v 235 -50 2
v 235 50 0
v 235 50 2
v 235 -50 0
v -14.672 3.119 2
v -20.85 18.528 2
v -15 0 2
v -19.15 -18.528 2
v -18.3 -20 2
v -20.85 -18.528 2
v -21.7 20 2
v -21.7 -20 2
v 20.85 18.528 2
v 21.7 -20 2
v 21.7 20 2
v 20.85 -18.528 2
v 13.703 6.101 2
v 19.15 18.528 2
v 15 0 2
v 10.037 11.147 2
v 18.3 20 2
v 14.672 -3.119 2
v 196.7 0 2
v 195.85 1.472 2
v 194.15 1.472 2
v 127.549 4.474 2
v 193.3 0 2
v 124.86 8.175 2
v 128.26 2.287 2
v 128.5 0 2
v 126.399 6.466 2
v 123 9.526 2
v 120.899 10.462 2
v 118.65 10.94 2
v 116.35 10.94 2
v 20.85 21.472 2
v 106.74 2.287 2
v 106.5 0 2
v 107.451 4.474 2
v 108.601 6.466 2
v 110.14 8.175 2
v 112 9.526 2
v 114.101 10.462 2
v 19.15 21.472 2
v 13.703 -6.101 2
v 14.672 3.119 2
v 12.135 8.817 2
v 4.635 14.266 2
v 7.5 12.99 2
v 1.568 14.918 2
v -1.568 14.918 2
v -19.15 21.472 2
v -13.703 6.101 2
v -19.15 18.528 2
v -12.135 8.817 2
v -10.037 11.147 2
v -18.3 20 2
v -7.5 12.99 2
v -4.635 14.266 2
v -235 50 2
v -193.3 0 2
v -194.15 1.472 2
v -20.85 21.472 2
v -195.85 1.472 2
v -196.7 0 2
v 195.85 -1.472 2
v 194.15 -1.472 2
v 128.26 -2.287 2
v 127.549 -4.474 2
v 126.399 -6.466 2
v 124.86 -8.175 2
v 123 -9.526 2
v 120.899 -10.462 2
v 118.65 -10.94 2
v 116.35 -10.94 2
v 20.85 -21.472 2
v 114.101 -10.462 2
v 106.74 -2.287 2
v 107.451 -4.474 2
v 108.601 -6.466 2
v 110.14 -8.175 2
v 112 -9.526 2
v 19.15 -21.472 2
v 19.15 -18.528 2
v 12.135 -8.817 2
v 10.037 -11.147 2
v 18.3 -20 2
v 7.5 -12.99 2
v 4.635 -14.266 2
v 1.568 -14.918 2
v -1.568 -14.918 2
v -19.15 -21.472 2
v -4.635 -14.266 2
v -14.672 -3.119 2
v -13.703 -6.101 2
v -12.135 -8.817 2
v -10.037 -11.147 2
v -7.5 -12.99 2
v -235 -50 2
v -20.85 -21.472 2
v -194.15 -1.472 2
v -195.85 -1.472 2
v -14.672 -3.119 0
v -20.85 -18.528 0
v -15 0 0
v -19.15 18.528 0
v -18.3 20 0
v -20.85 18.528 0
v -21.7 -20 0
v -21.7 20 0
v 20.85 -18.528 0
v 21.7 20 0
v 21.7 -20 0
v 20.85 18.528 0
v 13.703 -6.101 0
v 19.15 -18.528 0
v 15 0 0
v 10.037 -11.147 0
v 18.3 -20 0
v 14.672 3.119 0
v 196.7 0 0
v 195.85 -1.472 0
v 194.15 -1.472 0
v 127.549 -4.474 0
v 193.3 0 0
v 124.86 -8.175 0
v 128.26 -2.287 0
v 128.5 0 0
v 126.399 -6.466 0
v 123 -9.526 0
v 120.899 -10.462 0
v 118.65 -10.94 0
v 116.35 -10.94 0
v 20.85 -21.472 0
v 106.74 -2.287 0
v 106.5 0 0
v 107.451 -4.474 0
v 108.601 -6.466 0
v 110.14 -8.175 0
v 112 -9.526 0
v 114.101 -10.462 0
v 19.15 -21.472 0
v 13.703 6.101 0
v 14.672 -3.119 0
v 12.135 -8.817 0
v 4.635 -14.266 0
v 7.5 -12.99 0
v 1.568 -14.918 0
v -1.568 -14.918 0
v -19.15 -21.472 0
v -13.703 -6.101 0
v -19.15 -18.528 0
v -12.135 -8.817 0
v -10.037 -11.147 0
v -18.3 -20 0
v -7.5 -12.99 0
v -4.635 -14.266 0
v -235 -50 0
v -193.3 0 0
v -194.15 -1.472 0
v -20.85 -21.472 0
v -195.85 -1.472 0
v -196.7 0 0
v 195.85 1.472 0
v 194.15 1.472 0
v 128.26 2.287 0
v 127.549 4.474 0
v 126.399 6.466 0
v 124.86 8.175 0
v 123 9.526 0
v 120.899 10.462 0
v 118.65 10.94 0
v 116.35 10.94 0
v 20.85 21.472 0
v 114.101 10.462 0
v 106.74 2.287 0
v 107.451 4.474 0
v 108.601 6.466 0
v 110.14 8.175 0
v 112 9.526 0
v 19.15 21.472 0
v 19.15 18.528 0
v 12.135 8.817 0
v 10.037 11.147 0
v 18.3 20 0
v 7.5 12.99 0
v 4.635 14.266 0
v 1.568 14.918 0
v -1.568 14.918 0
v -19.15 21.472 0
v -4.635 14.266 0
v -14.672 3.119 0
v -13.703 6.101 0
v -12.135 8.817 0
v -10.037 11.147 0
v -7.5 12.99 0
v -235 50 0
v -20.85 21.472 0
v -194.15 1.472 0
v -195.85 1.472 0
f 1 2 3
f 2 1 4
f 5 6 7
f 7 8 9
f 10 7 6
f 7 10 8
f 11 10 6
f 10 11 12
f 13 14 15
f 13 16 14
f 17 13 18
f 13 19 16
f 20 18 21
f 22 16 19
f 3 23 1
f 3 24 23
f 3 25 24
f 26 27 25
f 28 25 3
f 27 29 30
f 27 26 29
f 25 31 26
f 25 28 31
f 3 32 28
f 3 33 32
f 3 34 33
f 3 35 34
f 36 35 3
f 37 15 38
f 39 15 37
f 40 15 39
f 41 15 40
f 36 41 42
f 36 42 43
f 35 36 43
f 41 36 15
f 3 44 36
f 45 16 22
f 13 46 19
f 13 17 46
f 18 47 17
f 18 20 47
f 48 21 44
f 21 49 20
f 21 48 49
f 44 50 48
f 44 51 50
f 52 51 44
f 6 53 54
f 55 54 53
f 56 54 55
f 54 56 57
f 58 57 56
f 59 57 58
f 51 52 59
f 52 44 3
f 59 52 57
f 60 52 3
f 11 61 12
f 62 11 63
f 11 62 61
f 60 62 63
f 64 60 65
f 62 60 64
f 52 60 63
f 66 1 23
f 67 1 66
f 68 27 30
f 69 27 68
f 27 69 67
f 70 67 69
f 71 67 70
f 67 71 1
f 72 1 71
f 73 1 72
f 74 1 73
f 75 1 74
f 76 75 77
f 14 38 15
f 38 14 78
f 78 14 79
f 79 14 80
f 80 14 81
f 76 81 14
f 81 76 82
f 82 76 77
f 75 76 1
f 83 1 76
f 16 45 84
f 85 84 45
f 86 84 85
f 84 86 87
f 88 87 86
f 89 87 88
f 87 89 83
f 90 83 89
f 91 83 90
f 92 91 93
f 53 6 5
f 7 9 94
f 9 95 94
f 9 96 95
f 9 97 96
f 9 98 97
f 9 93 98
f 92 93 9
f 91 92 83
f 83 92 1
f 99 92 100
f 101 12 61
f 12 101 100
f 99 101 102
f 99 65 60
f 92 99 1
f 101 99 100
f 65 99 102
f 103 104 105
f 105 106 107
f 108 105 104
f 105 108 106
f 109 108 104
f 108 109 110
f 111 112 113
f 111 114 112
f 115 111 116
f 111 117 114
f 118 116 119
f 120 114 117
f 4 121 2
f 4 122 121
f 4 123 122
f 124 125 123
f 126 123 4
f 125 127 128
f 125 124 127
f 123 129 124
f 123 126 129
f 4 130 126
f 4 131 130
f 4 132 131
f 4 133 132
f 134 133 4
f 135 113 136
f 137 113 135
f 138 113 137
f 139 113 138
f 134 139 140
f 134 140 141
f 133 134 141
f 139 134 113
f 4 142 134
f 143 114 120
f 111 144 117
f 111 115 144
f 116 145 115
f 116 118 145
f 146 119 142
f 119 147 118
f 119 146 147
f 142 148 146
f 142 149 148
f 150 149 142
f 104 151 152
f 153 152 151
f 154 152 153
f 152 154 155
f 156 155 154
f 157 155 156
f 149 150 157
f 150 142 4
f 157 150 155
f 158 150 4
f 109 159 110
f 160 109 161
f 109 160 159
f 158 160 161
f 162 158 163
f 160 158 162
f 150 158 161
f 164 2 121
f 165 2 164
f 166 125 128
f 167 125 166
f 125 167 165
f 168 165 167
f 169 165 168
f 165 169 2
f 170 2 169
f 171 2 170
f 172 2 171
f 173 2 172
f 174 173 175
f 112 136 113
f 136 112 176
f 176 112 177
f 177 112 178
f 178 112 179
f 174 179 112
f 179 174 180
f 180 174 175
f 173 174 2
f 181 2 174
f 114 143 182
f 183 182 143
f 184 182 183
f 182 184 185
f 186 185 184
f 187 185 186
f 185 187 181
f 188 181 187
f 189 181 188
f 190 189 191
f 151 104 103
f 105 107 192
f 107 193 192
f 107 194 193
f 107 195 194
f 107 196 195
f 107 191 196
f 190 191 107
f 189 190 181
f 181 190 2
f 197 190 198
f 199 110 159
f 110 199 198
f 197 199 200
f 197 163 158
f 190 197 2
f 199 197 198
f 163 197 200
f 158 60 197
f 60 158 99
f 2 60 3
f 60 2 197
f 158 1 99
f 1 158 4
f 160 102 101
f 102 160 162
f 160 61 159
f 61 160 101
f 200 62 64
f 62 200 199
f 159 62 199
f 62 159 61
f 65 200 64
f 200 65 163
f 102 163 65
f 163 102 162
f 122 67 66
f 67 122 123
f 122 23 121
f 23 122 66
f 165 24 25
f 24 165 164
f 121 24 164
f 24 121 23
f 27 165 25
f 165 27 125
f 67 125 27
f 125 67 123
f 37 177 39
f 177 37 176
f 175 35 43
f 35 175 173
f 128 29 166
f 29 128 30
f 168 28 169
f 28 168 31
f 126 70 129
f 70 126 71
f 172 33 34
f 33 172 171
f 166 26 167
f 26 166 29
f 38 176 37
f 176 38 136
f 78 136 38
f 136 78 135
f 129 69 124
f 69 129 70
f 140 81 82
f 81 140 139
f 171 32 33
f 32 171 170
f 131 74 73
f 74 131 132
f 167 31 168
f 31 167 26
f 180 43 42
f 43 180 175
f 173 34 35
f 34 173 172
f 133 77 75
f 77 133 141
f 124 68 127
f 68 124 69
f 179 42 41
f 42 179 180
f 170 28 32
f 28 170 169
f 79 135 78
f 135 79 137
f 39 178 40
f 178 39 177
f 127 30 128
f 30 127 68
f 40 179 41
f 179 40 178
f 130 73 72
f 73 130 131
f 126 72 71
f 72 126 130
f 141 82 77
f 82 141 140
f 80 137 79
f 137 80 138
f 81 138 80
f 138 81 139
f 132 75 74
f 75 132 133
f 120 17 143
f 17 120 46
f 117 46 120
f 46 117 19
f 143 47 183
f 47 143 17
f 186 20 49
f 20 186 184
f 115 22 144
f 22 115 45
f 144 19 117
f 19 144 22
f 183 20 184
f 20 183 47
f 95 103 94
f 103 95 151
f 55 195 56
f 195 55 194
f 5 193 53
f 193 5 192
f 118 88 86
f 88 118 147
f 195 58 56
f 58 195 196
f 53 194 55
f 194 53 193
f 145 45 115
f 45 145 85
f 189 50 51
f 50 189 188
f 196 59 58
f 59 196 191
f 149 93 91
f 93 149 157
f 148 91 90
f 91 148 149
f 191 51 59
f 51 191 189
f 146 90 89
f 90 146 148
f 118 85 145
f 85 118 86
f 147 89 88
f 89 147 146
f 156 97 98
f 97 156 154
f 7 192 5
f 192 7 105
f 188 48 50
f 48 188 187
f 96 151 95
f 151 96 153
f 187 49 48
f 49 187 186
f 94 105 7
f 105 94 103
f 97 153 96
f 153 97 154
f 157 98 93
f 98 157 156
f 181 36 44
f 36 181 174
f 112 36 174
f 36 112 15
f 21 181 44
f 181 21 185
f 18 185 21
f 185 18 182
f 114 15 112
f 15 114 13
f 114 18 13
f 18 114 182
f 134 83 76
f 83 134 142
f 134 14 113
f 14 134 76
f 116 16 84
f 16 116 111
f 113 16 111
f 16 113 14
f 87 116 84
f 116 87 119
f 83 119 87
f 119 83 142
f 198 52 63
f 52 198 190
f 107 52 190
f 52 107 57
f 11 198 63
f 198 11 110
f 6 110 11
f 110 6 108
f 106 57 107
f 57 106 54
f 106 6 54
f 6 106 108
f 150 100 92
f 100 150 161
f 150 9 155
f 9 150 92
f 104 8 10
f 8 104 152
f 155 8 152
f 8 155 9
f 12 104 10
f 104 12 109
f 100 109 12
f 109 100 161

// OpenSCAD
// file: Bohrung.scad
// Andre Betz
// github@AndreBetz.de
SchraubeM2 = 2.4;
SchraubeM3 = 3.4;

module Bohrloch(Durchmesser,posX,posY,Hoehe) 
{
    translate([posX,posY,-1])
        cylinder(
            Hoehe,
            Durchmesser/2,
            Durchmesser/2,
            center = false);
}
// main file
// Andre Betz
// github@AndreBetz.de
include <Bohrung.scad>

module MotorHalterung()
{
    Laenge = 470;
    Breite = 100;
    Hoehe  = 2;
    MotorWelle = 30;
    MotorBefAbstand = 40;
    TempSensorD = 22;
    
    difference() 
    {
        translate([-Laenge/2,-Breite/2,0])
            cube([Laenge,Breite,Hoehe]);
        
        Bohrloch(SchraubeM3,-Laenge/2+40,0,Hoehe*3);
        Bohrloch(SchraubeM3, Laenge/2-40,0,Hoehe*3);
        
        Bohrloch(TempSensorD, Laenge/4,0,Hoehe*3);

        Bohrloch(MotorWelle, 0,0,Hoehe*3);
        Bohrloch(SchraubeM3,  MotorBefAbstand/2, MotorBefAbstand/2,Hoehe*3);
        Bohrloch(SchraubeM3,  MotorBefAbstand/2,-MotorBefAbstand/2,Hoehe*3);
        Bohrloch(SchraubeM3, -MotorBefAbstand/2, MotorBefAbstand/2,Hoehe*3);
        Bohrloch(SchraubeM3, -MotorBefAbstand/2,-MotorBefAbstand/2,Hoehe*3);
    }
}

MotorHalterung();
